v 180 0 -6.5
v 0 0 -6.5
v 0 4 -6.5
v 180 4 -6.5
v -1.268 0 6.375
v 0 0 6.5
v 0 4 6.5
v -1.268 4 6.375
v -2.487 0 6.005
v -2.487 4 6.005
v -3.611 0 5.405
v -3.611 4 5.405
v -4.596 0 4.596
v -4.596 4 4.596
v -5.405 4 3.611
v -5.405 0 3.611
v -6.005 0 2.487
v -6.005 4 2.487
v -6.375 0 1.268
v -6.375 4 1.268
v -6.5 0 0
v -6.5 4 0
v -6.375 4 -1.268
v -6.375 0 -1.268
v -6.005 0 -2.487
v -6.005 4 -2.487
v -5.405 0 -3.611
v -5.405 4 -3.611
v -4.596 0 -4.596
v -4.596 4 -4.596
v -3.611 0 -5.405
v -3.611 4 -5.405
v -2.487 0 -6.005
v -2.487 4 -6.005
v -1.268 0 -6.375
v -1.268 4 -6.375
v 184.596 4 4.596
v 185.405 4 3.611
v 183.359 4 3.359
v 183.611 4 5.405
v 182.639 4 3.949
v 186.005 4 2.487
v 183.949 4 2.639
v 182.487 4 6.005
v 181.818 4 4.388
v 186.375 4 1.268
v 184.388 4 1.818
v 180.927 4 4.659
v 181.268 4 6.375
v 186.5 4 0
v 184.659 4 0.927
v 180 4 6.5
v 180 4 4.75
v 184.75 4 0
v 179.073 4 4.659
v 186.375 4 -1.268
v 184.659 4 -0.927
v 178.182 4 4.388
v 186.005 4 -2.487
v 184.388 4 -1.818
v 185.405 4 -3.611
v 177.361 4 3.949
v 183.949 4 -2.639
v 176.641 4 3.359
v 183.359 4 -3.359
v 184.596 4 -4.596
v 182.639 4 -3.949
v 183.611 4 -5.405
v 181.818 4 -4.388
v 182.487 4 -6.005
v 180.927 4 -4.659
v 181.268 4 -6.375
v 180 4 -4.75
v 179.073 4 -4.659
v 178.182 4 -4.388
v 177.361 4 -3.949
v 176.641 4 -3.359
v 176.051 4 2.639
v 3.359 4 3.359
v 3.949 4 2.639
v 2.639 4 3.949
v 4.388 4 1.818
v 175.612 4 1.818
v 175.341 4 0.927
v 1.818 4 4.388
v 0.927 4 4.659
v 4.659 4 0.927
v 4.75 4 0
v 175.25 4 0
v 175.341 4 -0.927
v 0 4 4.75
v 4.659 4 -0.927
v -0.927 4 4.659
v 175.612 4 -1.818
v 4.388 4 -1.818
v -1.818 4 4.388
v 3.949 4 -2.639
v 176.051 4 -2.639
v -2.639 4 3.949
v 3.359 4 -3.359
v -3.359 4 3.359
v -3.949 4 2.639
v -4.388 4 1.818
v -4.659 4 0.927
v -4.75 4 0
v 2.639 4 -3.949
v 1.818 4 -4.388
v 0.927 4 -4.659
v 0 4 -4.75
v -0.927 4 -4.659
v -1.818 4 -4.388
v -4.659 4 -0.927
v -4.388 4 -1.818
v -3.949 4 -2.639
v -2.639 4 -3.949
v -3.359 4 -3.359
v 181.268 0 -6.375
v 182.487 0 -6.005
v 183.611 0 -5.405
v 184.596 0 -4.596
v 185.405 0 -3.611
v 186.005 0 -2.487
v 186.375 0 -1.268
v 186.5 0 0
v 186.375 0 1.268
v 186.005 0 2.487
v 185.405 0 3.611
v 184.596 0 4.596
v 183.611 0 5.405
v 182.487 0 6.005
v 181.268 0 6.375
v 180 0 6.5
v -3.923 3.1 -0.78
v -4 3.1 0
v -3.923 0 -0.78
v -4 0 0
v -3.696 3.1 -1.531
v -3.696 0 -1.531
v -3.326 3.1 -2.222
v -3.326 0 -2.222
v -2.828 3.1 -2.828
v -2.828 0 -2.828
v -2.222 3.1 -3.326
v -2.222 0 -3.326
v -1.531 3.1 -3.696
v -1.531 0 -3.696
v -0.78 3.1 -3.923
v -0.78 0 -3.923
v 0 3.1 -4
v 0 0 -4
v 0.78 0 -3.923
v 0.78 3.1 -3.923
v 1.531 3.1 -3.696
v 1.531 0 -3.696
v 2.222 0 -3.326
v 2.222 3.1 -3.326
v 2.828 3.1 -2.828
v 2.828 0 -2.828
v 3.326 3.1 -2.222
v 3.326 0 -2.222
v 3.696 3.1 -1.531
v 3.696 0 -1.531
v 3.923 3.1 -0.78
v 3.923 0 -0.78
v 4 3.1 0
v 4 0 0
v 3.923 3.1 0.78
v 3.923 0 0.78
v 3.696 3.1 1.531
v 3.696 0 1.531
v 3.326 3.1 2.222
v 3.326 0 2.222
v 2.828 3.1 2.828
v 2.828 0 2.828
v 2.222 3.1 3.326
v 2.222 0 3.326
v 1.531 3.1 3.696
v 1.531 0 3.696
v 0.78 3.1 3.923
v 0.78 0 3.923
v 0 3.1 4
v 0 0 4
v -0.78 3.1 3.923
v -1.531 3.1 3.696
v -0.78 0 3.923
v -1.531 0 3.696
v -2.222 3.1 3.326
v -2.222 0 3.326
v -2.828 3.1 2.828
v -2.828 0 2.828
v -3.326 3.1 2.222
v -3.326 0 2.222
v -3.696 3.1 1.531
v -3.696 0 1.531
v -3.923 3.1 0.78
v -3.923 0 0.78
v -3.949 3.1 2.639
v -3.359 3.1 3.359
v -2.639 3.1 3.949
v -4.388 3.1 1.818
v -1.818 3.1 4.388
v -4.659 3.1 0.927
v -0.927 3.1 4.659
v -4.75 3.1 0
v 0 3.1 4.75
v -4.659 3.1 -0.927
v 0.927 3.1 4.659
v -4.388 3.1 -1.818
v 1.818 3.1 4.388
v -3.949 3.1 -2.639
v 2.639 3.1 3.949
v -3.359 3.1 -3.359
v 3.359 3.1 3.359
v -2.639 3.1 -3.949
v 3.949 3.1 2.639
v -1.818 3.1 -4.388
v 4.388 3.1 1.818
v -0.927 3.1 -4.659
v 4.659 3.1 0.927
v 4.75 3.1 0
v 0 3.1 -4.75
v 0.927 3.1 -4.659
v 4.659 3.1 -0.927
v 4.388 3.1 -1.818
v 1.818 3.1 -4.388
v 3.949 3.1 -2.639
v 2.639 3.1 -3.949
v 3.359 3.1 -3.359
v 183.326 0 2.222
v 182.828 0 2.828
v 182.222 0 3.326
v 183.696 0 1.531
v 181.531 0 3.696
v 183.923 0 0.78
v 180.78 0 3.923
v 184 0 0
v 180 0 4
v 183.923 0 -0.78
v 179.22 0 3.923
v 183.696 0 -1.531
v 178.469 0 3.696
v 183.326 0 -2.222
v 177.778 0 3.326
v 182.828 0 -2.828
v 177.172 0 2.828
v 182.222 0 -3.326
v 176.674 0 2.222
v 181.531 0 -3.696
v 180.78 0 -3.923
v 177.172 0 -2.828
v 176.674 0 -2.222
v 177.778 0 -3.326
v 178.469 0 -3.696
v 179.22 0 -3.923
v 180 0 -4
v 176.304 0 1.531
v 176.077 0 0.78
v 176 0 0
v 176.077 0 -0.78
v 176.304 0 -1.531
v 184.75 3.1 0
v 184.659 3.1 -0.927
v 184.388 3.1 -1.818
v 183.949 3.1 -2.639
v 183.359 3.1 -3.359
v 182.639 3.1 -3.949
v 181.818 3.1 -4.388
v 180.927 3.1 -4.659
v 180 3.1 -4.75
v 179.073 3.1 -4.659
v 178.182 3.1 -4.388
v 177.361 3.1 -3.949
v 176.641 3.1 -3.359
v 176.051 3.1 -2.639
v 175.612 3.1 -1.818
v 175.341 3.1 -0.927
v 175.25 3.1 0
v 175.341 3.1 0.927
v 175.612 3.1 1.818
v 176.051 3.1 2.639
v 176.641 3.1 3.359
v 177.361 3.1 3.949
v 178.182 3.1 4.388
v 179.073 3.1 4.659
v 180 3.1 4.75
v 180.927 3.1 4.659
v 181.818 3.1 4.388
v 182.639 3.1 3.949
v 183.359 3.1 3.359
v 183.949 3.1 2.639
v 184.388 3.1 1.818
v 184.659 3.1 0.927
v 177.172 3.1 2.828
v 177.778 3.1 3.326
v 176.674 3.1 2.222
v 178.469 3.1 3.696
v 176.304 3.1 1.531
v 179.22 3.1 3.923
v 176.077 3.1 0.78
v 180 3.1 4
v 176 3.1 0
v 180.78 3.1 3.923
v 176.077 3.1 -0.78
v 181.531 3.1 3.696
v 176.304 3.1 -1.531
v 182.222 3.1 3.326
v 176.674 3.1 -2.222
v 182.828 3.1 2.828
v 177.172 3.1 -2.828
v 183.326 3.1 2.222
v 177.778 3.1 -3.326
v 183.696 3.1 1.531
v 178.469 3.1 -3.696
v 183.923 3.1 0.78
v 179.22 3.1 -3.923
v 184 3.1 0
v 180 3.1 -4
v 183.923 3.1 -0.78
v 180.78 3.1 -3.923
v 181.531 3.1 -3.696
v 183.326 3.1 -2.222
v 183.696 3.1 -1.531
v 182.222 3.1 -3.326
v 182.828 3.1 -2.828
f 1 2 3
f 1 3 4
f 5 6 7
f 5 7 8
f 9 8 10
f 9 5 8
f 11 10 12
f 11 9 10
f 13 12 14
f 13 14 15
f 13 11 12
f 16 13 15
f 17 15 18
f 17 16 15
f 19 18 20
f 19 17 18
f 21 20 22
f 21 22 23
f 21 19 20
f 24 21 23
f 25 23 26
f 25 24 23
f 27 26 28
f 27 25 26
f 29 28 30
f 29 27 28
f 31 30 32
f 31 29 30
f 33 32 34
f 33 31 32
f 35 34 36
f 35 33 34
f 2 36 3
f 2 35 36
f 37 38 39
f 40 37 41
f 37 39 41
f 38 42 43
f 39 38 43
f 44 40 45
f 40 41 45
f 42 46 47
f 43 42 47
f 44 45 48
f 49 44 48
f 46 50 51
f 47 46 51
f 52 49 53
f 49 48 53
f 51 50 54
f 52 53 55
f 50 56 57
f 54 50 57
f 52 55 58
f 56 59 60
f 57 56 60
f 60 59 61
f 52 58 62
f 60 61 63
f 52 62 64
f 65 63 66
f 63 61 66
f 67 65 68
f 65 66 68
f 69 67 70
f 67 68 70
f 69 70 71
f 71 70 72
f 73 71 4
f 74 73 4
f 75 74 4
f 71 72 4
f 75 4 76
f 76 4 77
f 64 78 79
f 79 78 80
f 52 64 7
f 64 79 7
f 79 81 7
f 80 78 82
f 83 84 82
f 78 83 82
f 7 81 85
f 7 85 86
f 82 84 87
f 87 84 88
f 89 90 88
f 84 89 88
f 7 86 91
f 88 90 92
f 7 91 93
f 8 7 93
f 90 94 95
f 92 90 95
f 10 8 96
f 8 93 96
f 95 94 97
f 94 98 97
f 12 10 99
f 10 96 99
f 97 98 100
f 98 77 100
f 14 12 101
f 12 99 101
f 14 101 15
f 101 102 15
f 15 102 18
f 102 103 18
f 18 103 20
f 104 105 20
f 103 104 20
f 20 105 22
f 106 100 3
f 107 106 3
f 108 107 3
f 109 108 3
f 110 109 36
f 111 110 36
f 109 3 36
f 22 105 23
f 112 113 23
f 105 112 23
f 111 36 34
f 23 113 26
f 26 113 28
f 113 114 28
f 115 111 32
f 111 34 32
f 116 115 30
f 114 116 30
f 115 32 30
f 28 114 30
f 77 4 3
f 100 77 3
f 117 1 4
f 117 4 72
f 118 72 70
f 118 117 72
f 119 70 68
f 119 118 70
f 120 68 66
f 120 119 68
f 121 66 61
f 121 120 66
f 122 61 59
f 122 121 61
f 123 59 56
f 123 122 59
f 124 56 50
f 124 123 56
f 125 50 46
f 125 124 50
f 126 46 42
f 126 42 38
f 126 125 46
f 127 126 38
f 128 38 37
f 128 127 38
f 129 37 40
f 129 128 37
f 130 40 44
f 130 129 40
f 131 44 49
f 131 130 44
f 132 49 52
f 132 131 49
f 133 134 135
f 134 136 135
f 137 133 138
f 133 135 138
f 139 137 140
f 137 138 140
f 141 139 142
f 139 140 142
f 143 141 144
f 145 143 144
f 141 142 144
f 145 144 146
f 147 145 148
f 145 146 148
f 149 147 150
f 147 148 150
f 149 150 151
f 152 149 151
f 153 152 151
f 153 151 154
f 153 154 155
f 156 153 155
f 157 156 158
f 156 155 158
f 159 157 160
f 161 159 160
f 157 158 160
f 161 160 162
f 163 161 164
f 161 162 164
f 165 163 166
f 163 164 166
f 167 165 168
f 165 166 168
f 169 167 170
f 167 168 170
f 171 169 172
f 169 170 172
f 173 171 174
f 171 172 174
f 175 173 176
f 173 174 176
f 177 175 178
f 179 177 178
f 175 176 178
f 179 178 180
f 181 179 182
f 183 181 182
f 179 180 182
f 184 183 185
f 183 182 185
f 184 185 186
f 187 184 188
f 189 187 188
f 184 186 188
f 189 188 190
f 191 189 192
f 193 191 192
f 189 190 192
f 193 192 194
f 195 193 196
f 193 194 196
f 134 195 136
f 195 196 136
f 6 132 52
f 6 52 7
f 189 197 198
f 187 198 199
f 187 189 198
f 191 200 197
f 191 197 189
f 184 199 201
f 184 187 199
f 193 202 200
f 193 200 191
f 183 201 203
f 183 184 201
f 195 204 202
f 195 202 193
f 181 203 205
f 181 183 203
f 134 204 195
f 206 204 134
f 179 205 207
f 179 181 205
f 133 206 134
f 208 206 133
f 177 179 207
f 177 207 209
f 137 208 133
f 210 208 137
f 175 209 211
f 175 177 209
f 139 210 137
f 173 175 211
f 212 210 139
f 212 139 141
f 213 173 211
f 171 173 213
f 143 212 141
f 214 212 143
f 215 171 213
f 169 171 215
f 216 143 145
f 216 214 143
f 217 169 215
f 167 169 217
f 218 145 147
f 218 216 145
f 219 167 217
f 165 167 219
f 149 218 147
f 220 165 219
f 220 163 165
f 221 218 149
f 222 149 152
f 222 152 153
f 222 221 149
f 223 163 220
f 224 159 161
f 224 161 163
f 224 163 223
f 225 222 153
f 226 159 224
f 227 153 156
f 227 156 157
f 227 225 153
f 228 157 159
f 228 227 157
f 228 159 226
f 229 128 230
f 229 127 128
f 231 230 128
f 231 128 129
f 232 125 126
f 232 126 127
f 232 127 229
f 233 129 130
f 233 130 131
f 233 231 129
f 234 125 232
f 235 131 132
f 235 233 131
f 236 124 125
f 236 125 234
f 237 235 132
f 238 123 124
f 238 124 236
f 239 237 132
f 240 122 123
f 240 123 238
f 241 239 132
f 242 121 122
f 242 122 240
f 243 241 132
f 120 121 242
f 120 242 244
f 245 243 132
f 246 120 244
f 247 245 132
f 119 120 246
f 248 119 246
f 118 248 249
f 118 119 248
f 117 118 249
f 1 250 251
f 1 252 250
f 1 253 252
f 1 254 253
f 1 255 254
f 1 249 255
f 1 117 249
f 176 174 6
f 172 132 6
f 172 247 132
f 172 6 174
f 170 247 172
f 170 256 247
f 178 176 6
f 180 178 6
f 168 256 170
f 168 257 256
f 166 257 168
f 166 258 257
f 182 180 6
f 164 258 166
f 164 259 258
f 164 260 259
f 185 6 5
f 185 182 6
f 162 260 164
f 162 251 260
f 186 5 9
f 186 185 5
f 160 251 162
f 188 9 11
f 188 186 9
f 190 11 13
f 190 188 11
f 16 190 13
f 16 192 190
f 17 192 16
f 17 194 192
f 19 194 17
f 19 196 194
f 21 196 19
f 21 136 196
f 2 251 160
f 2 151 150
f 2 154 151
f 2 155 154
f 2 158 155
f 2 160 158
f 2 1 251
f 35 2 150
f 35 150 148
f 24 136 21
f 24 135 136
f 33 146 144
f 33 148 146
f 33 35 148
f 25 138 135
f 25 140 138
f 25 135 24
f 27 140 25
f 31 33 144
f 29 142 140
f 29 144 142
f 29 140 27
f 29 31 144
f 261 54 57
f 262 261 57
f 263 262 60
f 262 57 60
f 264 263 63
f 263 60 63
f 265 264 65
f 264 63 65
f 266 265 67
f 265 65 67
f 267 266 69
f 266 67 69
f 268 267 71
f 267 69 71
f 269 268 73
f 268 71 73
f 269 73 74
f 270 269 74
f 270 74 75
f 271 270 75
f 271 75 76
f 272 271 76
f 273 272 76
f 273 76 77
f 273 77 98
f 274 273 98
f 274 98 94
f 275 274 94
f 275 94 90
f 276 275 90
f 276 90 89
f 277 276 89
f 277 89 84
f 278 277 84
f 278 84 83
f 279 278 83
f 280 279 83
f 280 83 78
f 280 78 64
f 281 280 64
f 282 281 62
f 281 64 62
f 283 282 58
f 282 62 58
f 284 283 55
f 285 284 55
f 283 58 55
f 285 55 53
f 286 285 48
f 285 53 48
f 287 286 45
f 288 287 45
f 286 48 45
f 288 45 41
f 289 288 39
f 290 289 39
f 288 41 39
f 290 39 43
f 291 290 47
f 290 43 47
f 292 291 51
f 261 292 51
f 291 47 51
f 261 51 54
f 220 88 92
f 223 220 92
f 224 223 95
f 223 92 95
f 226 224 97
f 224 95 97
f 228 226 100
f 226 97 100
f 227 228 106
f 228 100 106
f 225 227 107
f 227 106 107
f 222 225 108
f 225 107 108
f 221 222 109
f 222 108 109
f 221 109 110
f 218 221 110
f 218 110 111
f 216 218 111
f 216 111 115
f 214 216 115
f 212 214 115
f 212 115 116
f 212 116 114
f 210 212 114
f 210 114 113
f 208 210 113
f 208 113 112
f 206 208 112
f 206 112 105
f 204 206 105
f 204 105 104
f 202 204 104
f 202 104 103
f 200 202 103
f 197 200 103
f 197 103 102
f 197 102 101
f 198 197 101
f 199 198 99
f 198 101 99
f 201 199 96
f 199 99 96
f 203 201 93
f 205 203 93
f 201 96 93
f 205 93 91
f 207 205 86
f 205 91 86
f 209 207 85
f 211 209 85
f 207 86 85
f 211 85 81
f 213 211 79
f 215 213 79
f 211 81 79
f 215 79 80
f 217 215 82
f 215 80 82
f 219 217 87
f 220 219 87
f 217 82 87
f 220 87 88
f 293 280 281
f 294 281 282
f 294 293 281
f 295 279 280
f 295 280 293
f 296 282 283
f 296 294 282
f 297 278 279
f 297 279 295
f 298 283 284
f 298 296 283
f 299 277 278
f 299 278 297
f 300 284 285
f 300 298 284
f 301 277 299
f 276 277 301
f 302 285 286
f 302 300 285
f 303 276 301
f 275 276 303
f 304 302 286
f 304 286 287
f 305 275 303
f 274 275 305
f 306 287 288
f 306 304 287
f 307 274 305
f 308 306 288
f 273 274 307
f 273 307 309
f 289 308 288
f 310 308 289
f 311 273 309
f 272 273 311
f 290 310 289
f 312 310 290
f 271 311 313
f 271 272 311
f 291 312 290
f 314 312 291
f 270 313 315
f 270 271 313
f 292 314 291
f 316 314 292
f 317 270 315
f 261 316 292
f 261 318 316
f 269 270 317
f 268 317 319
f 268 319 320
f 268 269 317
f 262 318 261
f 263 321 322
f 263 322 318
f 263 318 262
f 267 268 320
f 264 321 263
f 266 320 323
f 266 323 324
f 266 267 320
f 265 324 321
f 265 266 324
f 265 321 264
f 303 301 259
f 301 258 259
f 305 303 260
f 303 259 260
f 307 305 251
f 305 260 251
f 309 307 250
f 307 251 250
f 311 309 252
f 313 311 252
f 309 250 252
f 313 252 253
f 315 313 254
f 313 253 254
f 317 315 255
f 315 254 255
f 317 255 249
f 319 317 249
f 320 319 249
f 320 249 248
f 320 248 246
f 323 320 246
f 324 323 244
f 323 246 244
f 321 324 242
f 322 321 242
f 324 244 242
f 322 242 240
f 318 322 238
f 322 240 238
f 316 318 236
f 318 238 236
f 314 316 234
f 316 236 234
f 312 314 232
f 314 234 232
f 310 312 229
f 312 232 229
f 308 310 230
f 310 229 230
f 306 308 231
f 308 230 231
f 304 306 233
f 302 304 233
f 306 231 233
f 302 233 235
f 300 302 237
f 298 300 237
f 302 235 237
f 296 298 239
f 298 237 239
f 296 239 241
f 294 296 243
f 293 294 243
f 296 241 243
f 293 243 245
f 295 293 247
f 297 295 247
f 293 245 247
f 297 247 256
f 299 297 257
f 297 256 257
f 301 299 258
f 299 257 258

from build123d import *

# Parameters (mm, degrees)
EXTRUDE_1_DEPTH              = 4
HOLE_WIZARD_M5_1_D           = 8
HOLE_WIZARD_M5_1_CBORE_D     = 9.5
HOLE_WIZARD_M5_1_CBORE_DEPTH = 0.9


with BuildPart() as part:
    # 草图1 → 凸台-拉伸1 (new body)
    with BuildSketch(Plane(origin=(0, 0, 0), x_dir=(1, 0, 0), z_dir=(0, 1, 0))):
        with BuildLine():
            Line((0, 6.5), (180, 6.5))
            ThreePointArc((180, 6.5), (186.5, 0), (180, -6.5))
            Line((180, -6.5), (0, -6.5))
            ThreePointArc((0, -6.5), (-6.5, 0), (0, 6.5))
        make_face()
    extrude(amount=EXTRUDE_1_DEPTH)

    # M5 六角头螺栓的柱形沉头孔1 (through all)
    with Locations(Plane(origin=(0, 4, 0), x_dir=(1, 0, 0), z_dir=(0, 1, 0))):
        with Locations((180, 0), (0, 0)):
            CounterBoreHole(HOLE_WIZARD_M5_1_D / 2, HOLE_WIZARD_M5_1_CBORE_D / 2, HOLE_WIZARD_M5_1_CBORE_DEPTH)


solid = part.part
